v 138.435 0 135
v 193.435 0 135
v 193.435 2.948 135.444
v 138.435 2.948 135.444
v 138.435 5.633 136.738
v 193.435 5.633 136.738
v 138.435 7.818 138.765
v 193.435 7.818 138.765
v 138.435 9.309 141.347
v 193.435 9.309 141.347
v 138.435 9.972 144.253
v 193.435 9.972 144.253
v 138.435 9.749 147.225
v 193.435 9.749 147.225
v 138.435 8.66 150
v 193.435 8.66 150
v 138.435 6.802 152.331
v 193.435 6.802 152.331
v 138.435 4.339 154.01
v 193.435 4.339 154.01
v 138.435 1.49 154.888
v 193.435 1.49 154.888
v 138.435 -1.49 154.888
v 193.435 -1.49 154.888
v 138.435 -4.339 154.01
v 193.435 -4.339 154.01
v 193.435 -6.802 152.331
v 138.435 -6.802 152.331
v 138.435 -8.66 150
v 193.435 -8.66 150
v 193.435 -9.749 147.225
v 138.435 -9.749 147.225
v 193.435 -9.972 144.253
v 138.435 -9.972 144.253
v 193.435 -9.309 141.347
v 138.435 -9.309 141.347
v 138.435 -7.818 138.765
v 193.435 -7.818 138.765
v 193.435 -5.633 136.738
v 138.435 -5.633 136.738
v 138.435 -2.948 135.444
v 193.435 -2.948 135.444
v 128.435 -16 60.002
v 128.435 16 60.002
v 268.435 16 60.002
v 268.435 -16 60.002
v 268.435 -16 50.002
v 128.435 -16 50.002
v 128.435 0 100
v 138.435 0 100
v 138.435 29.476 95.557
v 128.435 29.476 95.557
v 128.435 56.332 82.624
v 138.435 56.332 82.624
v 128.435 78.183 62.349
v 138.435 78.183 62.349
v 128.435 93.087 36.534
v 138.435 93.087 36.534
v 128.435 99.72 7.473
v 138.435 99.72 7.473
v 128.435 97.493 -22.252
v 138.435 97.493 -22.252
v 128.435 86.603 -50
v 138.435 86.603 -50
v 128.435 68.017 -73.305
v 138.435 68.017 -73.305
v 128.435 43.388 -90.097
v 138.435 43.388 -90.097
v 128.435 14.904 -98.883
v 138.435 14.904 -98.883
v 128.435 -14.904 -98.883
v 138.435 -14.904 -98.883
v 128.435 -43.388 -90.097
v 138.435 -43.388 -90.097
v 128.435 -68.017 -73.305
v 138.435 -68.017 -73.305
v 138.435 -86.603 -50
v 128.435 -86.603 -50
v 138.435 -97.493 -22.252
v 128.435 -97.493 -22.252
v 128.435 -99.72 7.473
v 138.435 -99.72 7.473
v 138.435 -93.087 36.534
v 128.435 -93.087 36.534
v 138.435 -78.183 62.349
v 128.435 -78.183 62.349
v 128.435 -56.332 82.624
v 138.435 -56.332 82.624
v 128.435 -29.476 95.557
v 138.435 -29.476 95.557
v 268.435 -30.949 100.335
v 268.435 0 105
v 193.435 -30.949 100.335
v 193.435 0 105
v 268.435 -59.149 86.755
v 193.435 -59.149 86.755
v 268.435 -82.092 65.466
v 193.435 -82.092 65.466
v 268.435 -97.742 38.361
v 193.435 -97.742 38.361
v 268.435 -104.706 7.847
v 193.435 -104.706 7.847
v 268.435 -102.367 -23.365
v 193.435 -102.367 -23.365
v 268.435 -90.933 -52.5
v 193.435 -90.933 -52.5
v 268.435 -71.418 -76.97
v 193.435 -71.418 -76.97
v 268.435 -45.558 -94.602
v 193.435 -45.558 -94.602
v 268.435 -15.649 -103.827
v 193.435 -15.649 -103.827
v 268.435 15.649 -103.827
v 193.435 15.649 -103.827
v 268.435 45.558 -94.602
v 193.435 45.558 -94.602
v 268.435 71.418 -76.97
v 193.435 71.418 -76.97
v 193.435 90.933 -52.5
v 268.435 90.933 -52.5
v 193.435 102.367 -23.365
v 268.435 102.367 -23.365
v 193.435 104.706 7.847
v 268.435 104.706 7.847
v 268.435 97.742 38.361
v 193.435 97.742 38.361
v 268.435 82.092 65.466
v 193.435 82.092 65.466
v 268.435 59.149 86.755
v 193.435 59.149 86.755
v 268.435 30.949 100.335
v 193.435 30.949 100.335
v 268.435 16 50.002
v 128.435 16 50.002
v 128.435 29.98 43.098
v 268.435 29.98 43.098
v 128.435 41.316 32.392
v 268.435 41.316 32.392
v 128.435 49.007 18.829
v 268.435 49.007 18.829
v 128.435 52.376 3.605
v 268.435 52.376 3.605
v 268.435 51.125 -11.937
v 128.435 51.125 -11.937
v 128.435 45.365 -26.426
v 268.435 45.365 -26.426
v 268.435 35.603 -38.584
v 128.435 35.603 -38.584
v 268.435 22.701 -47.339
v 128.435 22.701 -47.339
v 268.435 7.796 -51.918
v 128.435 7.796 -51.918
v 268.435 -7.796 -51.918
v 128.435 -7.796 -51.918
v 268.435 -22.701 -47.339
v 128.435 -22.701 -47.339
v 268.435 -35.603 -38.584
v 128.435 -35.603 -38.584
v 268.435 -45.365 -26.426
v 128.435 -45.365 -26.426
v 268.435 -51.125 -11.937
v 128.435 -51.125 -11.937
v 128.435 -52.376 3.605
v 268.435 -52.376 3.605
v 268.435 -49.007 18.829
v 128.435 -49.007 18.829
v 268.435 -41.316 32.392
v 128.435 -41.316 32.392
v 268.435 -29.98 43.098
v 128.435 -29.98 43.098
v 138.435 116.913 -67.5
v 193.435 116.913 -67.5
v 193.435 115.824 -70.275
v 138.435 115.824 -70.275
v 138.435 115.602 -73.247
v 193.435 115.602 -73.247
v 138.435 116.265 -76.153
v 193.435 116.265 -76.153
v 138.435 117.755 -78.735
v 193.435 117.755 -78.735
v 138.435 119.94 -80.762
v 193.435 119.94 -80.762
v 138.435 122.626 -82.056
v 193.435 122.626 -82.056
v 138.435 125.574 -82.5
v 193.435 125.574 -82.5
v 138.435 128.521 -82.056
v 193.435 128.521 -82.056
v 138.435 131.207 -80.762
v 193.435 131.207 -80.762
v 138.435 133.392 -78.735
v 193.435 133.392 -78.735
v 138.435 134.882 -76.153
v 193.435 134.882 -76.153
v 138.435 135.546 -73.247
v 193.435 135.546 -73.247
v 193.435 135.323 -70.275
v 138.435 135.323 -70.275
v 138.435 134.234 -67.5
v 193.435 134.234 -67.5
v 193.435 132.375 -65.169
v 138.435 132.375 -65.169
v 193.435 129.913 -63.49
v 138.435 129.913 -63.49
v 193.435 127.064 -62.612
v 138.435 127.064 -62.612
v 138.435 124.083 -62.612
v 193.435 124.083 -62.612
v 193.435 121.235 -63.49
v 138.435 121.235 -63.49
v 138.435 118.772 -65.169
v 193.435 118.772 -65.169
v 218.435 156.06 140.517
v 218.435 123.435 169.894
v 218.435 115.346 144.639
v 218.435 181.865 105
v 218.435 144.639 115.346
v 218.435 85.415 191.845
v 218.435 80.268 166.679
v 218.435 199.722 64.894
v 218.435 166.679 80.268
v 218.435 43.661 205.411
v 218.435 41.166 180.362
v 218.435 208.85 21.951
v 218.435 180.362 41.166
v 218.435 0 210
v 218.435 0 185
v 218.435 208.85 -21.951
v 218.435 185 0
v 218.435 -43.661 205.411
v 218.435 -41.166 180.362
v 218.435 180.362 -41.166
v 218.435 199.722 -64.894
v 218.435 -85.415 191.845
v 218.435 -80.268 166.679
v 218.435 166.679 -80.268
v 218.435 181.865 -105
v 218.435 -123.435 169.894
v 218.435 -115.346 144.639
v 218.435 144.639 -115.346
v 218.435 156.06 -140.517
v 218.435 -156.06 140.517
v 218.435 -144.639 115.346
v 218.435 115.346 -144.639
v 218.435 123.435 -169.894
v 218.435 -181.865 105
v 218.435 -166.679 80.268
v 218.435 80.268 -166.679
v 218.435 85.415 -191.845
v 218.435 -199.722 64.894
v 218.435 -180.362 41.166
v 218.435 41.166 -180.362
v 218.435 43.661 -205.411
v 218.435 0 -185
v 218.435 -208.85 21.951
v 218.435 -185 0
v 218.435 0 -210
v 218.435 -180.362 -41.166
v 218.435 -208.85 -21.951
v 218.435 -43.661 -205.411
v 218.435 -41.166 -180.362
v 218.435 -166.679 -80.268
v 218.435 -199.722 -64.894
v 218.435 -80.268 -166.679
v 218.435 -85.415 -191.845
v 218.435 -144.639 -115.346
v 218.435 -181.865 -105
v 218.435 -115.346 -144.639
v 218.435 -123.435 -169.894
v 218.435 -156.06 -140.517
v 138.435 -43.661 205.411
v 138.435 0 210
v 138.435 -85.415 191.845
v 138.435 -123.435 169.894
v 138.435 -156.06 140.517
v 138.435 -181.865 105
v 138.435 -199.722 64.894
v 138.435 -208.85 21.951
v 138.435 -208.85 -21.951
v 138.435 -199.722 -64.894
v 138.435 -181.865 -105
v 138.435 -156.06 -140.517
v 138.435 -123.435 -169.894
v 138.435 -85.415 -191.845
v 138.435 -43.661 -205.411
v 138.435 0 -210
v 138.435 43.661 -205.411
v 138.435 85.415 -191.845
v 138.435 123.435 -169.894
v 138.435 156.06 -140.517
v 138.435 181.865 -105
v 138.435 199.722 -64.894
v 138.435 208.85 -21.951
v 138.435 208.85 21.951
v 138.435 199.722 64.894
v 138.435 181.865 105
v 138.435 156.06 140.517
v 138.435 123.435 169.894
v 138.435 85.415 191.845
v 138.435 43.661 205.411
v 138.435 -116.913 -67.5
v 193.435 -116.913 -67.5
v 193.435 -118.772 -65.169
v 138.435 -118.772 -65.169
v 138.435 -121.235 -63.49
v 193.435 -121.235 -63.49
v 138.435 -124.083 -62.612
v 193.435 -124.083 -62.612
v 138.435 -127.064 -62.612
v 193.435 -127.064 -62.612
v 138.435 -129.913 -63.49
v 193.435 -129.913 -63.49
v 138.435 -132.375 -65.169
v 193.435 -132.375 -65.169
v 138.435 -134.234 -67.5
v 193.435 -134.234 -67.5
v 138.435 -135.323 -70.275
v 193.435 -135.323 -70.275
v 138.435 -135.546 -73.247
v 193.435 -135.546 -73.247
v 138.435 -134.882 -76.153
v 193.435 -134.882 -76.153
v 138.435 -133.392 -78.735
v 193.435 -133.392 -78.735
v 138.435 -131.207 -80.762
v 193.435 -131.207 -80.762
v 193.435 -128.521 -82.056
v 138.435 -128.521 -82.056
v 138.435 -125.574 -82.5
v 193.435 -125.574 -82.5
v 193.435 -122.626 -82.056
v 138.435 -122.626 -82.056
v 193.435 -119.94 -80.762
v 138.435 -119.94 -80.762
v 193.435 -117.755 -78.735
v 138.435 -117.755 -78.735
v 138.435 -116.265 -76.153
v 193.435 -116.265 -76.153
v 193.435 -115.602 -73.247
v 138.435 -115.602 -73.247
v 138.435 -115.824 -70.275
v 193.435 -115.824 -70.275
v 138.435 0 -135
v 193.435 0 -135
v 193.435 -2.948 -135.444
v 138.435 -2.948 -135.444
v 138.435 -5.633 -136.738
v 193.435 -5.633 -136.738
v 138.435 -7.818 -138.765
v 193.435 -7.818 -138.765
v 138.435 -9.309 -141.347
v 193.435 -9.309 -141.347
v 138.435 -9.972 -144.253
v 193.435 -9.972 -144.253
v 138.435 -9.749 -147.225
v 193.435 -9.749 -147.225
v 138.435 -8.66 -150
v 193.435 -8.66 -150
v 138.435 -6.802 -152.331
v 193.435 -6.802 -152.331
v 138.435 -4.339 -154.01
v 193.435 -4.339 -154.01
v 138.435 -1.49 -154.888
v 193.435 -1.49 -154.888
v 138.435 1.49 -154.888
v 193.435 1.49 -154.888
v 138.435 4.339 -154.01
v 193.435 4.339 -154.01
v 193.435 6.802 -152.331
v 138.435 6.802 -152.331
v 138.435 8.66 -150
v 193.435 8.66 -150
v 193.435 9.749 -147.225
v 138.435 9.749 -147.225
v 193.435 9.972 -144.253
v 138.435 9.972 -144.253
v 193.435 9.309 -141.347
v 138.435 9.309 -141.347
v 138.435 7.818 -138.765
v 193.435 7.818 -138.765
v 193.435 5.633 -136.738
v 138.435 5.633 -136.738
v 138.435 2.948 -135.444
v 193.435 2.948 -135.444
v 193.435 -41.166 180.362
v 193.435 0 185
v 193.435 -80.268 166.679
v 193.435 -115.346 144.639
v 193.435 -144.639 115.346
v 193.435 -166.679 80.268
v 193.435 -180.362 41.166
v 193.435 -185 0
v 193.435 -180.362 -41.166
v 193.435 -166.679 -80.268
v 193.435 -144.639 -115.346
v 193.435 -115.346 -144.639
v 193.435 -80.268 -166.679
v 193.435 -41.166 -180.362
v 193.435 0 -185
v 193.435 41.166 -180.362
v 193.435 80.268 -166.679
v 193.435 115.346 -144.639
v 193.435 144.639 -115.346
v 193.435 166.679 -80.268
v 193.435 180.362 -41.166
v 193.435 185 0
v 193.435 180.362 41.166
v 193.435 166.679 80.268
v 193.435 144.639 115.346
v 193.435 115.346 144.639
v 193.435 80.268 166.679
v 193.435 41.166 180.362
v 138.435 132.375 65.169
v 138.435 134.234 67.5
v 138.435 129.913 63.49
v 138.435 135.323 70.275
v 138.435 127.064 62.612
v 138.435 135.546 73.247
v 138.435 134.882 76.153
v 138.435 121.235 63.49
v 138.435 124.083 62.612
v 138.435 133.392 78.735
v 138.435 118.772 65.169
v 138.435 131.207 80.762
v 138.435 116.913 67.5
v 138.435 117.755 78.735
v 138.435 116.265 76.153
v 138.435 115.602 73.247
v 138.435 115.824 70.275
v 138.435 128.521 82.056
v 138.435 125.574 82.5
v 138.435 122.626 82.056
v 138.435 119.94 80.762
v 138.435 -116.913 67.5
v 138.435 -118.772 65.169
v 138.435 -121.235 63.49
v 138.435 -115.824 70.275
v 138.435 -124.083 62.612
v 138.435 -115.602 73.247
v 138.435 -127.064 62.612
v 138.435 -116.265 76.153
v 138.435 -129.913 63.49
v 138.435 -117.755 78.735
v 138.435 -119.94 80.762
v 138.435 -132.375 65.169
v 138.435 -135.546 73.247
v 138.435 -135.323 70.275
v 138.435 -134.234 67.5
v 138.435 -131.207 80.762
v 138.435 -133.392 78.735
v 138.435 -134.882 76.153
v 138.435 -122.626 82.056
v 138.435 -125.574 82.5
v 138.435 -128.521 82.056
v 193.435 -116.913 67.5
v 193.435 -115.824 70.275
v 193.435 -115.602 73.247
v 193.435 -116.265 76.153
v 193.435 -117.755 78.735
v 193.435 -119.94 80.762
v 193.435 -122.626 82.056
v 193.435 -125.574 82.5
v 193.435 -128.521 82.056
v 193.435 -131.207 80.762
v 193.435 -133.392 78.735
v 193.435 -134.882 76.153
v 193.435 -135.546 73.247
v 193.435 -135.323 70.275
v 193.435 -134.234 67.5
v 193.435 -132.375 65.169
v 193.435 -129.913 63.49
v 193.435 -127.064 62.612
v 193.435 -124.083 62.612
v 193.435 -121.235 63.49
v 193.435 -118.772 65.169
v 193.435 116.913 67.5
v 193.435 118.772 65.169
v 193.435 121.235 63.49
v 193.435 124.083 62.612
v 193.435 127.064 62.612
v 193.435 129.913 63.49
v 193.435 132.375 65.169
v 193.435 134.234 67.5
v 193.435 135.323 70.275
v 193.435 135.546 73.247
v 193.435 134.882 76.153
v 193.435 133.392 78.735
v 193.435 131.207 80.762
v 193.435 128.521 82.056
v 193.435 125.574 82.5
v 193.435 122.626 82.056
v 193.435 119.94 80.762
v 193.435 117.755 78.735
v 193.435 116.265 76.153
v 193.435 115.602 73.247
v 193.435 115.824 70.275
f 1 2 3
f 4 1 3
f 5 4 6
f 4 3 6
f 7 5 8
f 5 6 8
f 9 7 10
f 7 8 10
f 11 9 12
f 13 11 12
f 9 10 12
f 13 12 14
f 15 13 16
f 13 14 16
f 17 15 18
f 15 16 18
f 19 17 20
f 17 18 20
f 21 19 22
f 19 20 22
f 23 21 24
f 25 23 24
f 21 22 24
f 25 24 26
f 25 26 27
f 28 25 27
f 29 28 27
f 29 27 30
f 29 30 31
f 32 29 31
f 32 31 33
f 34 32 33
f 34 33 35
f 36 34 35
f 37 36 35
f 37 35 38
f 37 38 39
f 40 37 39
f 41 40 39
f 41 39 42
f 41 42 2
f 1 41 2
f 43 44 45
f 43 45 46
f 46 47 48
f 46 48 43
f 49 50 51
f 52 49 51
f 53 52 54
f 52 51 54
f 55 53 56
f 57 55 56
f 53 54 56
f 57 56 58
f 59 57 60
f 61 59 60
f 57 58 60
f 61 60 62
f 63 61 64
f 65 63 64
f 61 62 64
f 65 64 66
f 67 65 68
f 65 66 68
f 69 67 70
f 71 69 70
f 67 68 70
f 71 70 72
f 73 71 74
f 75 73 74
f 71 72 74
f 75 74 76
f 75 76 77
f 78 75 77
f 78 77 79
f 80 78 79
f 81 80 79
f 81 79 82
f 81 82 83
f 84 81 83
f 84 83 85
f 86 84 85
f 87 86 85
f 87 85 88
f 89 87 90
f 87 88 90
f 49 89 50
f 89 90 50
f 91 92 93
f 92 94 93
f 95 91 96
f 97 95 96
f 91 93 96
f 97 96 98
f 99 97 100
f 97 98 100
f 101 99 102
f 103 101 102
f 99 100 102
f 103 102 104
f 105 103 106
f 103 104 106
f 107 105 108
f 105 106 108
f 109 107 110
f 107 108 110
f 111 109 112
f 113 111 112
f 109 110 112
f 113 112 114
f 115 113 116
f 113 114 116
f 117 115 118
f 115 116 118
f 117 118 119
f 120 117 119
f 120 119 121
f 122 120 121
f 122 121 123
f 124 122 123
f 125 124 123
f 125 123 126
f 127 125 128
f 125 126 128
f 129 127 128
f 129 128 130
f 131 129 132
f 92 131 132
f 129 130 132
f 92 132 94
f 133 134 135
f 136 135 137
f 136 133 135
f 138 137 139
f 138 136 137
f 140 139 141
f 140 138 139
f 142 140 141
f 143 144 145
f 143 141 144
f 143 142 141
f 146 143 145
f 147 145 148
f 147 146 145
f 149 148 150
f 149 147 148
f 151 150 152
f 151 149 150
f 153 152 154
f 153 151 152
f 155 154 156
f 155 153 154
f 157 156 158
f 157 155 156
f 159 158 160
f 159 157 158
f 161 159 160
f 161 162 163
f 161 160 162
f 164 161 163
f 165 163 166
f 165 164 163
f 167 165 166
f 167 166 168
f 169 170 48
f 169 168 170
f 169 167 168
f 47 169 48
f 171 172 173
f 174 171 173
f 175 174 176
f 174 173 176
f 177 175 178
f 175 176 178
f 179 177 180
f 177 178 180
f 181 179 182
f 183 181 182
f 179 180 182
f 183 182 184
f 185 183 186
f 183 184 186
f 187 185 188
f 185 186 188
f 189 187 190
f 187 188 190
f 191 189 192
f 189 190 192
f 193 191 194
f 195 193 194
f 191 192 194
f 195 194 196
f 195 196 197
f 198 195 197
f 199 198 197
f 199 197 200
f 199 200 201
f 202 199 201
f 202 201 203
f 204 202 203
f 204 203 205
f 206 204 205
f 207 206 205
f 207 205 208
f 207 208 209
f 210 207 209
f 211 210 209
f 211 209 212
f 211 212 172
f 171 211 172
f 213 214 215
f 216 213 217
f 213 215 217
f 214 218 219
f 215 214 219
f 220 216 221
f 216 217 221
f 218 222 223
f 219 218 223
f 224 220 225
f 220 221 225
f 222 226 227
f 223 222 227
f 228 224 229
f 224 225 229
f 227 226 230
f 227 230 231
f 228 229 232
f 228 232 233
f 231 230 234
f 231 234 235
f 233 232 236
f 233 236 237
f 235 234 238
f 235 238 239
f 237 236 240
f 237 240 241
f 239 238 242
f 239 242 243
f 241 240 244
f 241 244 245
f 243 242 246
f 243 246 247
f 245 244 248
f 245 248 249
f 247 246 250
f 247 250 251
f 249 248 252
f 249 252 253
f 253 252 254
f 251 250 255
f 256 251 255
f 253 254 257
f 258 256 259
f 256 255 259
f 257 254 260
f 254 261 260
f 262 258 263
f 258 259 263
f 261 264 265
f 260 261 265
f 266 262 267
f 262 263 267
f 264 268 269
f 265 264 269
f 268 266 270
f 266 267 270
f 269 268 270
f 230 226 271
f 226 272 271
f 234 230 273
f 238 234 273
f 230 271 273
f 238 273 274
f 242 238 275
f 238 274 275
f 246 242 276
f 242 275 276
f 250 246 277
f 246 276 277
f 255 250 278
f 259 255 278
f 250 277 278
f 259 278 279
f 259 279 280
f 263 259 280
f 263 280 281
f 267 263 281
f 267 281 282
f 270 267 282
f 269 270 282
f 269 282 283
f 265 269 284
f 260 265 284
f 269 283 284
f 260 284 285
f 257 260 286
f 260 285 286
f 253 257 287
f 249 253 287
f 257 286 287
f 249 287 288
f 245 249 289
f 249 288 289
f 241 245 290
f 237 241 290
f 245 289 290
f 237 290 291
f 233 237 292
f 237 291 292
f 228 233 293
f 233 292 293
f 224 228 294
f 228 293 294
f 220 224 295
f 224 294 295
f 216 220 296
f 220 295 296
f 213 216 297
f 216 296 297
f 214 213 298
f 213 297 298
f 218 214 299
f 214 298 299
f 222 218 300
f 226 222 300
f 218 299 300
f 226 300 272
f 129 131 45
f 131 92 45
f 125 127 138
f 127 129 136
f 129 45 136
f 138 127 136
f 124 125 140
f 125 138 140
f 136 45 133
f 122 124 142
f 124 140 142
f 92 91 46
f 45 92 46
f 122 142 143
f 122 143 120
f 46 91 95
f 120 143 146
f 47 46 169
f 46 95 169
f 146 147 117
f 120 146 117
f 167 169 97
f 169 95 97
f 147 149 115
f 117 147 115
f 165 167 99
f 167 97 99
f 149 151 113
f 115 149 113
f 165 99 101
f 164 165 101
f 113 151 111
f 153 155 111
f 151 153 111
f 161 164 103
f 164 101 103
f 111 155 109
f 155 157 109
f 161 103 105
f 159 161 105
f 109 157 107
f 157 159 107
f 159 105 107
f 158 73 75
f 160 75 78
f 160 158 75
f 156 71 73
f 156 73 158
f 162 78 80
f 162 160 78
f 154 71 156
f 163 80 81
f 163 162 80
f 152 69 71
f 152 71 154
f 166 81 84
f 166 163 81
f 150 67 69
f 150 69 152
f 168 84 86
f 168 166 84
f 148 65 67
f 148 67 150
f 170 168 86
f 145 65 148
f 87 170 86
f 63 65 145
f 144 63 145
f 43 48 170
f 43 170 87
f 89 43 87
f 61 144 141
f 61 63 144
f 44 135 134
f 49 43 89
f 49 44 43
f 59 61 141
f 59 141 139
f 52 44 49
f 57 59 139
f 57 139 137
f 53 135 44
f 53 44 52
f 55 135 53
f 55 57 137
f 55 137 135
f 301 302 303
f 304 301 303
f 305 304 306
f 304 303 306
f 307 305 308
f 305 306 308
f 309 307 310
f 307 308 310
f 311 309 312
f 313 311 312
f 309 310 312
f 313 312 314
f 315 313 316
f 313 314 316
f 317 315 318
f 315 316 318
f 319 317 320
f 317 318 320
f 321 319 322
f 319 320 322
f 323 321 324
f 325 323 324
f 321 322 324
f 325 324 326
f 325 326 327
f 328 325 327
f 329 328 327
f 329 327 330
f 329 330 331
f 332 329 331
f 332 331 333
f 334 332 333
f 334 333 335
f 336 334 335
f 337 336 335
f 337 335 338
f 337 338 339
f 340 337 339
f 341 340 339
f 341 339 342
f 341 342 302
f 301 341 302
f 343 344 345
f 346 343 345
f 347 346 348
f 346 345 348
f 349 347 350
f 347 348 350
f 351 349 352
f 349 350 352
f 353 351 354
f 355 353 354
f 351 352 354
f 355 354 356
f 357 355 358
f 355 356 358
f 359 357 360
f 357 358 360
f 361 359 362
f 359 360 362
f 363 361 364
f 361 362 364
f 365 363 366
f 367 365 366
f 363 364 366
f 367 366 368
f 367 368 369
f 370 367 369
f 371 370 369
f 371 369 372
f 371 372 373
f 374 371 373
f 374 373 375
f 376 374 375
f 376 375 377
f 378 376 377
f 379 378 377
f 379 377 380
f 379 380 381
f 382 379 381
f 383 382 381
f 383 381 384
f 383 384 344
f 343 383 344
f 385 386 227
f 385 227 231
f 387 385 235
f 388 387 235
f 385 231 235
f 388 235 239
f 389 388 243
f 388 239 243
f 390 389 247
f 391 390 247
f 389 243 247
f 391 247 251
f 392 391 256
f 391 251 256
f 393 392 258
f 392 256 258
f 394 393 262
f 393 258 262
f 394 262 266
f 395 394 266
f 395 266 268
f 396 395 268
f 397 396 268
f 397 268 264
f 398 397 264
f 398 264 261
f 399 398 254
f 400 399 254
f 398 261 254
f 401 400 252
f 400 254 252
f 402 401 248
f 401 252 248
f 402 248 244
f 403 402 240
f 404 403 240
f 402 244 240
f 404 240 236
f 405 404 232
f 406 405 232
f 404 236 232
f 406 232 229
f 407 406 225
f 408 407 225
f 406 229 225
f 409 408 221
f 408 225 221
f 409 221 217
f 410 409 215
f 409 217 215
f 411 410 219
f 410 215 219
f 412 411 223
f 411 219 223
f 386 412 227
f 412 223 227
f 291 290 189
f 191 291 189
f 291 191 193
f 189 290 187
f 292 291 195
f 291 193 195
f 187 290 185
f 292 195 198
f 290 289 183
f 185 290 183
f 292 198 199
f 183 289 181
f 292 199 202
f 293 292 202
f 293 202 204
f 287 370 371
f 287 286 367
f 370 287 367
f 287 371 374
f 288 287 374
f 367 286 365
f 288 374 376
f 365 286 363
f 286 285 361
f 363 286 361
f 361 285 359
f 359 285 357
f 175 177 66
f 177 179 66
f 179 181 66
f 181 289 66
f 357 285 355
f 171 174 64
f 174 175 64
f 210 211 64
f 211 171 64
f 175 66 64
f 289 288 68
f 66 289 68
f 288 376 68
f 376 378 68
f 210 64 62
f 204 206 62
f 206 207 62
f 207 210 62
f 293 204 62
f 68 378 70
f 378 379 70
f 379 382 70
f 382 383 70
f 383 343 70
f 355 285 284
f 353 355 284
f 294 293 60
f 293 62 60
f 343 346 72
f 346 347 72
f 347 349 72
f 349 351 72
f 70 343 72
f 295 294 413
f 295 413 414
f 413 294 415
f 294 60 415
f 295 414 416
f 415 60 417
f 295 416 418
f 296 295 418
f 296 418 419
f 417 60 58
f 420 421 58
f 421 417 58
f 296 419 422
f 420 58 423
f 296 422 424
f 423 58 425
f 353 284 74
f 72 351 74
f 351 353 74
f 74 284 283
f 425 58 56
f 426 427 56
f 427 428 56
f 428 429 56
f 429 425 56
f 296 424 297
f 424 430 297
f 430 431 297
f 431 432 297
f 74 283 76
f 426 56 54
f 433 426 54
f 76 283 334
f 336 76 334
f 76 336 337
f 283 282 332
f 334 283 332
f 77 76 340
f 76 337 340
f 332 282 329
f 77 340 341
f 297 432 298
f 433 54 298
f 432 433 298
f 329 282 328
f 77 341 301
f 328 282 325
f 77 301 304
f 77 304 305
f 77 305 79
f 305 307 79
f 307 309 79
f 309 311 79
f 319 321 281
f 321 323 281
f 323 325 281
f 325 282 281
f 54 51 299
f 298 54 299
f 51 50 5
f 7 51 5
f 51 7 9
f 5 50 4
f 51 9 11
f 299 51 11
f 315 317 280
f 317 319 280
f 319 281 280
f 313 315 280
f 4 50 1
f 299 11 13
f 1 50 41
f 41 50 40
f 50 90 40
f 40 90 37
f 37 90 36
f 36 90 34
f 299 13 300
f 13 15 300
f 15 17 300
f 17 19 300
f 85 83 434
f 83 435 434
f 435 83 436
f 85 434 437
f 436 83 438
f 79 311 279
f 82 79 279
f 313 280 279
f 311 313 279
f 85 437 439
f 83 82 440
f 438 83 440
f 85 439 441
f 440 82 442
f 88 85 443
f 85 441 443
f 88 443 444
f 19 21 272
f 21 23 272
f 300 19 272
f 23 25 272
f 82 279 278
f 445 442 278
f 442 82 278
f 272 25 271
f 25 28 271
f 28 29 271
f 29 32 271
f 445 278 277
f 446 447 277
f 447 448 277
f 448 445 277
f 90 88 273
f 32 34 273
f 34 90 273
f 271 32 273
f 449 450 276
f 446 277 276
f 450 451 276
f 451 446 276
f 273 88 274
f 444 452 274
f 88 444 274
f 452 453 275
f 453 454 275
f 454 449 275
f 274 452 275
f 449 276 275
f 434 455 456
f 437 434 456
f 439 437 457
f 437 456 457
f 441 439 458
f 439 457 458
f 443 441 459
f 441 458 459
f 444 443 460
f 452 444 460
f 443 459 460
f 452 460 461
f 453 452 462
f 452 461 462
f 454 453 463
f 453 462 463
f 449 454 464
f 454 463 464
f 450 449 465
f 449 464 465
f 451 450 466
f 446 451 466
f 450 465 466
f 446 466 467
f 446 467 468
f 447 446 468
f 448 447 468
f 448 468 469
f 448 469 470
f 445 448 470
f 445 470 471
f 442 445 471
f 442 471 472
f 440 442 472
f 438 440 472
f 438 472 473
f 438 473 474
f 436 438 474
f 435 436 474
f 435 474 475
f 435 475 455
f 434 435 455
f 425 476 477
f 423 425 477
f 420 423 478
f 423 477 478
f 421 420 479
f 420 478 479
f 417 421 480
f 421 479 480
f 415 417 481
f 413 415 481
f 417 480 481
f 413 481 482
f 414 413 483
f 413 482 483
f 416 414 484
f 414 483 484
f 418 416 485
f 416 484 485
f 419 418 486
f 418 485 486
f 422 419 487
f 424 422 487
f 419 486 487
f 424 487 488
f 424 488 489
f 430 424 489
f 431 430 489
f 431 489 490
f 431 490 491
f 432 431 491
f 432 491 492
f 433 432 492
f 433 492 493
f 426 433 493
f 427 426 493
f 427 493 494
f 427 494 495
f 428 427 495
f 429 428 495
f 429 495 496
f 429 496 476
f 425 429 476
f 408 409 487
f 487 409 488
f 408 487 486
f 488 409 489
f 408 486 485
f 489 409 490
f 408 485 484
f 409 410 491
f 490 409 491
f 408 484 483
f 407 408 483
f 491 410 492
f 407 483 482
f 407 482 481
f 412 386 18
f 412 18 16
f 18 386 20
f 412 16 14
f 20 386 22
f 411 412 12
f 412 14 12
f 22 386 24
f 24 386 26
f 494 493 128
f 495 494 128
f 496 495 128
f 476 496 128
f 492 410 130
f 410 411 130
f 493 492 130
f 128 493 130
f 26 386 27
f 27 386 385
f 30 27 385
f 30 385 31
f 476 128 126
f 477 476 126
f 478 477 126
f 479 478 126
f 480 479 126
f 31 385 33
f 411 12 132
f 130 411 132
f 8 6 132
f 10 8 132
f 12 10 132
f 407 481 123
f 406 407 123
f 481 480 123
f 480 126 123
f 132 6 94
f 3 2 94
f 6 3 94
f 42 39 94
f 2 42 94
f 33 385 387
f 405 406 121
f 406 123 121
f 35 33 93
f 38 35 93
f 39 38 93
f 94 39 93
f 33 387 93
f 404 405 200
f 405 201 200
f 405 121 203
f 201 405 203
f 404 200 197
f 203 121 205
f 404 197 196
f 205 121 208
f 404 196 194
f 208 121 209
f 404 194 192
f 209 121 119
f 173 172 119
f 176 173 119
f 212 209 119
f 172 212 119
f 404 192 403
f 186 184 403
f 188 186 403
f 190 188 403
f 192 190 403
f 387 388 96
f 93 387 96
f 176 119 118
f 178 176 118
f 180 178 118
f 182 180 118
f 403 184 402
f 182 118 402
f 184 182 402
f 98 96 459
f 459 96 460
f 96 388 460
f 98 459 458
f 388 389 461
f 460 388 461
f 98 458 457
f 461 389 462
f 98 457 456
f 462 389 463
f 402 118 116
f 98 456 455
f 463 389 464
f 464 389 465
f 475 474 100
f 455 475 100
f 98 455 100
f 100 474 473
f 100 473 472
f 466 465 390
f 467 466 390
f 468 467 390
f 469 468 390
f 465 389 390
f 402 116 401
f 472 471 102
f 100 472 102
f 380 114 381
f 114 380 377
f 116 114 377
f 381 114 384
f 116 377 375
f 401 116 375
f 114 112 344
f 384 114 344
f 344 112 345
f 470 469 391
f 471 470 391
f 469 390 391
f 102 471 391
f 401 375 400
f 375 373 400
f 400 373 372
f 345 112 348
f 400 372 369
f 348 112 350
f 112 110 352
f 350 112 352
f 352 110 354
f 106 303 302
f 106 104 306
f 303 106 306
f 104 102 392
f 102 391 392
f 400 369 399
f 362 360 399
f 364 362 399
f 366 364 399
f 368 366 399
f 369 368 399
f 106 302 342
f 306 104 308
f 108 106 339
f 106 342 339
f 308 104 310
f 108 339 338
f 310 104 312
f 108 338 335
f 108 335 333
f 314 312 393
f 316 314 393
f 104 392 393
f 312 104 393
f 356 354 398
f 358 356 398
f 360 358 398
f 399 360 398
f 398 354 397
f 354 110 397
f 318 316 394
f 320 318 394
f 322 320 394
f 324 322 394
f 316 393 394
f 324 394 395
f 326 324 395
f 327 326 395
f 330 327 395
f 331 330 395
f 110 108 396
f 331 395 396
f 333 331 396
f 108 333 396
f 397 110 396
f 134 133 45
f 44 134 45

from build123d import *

# Parameters (mm, degrees)
SKETCH3_R               = 10
CUT_EXTRUDE1_DEPTH      = 307.30866785
CIRPATTERN1_COUNT       = 6
SKETCH5_R               = 100
BOSS_EXTRUDE1_DEPTH     = 10
CUT_EXTRUDE2_DEPTH      = 325.191301549
CUT_EXTRUDE2_DEPTH_BACK = 325.191301549
SKETCH4_W               = 32
SKETCH4_H               = 10
CUT_EXTRUDE4_DEPTH      = 329.329103188
CUT_EXTRUDE4_DEPTH_BACK = 329.329103188
SKETCH6_R               = 52.5


with BuildPart() as part:
    # Sketch2 → Revolve1 (revolve)
    with BuildSketch(Plane(origin=(0, 0, 0), x_dir=(-1, 0, 0), z_dir=(0, 1, 0))):
        Polygon((-138.434782609, 52.5), (-268.434782609, 52.5), (-268.434782609, 105), (-193.434782609, 105), (-193.434782609, 185), (-218.434782609, 185), (-218.434782609, 210), (-138.434782609, 210), align=None)
    revolve(axis=Axis((0, 0, 0), (1, 0, 0)))

    # Sketch3 → Cut-Extrude1 (cut, through all)
    with BuildSketch(Plane.YZ.offset(193.434782609)):
        with Locations(Location((0, 145, 0), (0, 0, 270))):
            Circle(SKETCH3_R)
    cut_extrude1 = extrude(amount=-CUT_EXTRUDE1_DEPTH, mode=Mode.SUBTRACT)

    # CirPattern1: Cut-Extrude1 ×6 about axis
    cirpattern1_axis = Axis((0, 0, 0), (1, 0, 0))
    for i in range(1, CIRPATTERN1_COUNT):
        add(cut_extrude1.rotate(cirpattern1_axis, i * 360 / CIRPATTERN1_COUNT), mode=Mode.SUBTRACT)

    # Sketch5 → Boss-Extrude1 (add)
    with BuildSketch(Plane(origin=(138.434782609, 0, 0), x_dir=(0, -1, 0), z_dir=(-1, 0, 0))):
        with Locations(Location((0, 0, 0), (0, 0, 90))):
            Circle(SKETCH5_R)
    extrude(amount=BOSS_EXTRUDE1_DEPTH)

    # Sketch4 → Cut-Extrude2 (cut, two sides: drawn at the far end of the back side and taken through both)
    with BuildSketch(Plane(origin=(138.434782609, 0, 0), x_dir=(0, -1, 0), z_dir=(-1, 0, 0)).offset(-CUT_EXTRUDE2_DEPTH_BACK)):
        with Locations((0, 55.002499938)):
            Rectangle(SKETCH4_W, SKETCH4_H)
    extrude(amount=CUT_EXTRUDE2_DEPTH + CUT_EXTRUDE2_DEPTH_BACK, mode=Mode.SUBTRACT)

    # Sketch6 → Cut-Extrude4 (cut, two sides: drawn at the far end of the back side and taken through both)
    with BuildSketch(Plane(origin=(128.434782609, 0, 0), x_dir=(0, -1, 0), z_dir=(-1, 0, 0)).offset(-CUT_EXTRUDE4_DEPTH_BACK)):
        Circle(SKETCH6_R)
    extrude(amount=CUT_EXTRUDE4_DEPTH + CUT_EXTRUDE4_DEPTH_BACK, mode=Mode.SUBTRACT)


solid = part.part
